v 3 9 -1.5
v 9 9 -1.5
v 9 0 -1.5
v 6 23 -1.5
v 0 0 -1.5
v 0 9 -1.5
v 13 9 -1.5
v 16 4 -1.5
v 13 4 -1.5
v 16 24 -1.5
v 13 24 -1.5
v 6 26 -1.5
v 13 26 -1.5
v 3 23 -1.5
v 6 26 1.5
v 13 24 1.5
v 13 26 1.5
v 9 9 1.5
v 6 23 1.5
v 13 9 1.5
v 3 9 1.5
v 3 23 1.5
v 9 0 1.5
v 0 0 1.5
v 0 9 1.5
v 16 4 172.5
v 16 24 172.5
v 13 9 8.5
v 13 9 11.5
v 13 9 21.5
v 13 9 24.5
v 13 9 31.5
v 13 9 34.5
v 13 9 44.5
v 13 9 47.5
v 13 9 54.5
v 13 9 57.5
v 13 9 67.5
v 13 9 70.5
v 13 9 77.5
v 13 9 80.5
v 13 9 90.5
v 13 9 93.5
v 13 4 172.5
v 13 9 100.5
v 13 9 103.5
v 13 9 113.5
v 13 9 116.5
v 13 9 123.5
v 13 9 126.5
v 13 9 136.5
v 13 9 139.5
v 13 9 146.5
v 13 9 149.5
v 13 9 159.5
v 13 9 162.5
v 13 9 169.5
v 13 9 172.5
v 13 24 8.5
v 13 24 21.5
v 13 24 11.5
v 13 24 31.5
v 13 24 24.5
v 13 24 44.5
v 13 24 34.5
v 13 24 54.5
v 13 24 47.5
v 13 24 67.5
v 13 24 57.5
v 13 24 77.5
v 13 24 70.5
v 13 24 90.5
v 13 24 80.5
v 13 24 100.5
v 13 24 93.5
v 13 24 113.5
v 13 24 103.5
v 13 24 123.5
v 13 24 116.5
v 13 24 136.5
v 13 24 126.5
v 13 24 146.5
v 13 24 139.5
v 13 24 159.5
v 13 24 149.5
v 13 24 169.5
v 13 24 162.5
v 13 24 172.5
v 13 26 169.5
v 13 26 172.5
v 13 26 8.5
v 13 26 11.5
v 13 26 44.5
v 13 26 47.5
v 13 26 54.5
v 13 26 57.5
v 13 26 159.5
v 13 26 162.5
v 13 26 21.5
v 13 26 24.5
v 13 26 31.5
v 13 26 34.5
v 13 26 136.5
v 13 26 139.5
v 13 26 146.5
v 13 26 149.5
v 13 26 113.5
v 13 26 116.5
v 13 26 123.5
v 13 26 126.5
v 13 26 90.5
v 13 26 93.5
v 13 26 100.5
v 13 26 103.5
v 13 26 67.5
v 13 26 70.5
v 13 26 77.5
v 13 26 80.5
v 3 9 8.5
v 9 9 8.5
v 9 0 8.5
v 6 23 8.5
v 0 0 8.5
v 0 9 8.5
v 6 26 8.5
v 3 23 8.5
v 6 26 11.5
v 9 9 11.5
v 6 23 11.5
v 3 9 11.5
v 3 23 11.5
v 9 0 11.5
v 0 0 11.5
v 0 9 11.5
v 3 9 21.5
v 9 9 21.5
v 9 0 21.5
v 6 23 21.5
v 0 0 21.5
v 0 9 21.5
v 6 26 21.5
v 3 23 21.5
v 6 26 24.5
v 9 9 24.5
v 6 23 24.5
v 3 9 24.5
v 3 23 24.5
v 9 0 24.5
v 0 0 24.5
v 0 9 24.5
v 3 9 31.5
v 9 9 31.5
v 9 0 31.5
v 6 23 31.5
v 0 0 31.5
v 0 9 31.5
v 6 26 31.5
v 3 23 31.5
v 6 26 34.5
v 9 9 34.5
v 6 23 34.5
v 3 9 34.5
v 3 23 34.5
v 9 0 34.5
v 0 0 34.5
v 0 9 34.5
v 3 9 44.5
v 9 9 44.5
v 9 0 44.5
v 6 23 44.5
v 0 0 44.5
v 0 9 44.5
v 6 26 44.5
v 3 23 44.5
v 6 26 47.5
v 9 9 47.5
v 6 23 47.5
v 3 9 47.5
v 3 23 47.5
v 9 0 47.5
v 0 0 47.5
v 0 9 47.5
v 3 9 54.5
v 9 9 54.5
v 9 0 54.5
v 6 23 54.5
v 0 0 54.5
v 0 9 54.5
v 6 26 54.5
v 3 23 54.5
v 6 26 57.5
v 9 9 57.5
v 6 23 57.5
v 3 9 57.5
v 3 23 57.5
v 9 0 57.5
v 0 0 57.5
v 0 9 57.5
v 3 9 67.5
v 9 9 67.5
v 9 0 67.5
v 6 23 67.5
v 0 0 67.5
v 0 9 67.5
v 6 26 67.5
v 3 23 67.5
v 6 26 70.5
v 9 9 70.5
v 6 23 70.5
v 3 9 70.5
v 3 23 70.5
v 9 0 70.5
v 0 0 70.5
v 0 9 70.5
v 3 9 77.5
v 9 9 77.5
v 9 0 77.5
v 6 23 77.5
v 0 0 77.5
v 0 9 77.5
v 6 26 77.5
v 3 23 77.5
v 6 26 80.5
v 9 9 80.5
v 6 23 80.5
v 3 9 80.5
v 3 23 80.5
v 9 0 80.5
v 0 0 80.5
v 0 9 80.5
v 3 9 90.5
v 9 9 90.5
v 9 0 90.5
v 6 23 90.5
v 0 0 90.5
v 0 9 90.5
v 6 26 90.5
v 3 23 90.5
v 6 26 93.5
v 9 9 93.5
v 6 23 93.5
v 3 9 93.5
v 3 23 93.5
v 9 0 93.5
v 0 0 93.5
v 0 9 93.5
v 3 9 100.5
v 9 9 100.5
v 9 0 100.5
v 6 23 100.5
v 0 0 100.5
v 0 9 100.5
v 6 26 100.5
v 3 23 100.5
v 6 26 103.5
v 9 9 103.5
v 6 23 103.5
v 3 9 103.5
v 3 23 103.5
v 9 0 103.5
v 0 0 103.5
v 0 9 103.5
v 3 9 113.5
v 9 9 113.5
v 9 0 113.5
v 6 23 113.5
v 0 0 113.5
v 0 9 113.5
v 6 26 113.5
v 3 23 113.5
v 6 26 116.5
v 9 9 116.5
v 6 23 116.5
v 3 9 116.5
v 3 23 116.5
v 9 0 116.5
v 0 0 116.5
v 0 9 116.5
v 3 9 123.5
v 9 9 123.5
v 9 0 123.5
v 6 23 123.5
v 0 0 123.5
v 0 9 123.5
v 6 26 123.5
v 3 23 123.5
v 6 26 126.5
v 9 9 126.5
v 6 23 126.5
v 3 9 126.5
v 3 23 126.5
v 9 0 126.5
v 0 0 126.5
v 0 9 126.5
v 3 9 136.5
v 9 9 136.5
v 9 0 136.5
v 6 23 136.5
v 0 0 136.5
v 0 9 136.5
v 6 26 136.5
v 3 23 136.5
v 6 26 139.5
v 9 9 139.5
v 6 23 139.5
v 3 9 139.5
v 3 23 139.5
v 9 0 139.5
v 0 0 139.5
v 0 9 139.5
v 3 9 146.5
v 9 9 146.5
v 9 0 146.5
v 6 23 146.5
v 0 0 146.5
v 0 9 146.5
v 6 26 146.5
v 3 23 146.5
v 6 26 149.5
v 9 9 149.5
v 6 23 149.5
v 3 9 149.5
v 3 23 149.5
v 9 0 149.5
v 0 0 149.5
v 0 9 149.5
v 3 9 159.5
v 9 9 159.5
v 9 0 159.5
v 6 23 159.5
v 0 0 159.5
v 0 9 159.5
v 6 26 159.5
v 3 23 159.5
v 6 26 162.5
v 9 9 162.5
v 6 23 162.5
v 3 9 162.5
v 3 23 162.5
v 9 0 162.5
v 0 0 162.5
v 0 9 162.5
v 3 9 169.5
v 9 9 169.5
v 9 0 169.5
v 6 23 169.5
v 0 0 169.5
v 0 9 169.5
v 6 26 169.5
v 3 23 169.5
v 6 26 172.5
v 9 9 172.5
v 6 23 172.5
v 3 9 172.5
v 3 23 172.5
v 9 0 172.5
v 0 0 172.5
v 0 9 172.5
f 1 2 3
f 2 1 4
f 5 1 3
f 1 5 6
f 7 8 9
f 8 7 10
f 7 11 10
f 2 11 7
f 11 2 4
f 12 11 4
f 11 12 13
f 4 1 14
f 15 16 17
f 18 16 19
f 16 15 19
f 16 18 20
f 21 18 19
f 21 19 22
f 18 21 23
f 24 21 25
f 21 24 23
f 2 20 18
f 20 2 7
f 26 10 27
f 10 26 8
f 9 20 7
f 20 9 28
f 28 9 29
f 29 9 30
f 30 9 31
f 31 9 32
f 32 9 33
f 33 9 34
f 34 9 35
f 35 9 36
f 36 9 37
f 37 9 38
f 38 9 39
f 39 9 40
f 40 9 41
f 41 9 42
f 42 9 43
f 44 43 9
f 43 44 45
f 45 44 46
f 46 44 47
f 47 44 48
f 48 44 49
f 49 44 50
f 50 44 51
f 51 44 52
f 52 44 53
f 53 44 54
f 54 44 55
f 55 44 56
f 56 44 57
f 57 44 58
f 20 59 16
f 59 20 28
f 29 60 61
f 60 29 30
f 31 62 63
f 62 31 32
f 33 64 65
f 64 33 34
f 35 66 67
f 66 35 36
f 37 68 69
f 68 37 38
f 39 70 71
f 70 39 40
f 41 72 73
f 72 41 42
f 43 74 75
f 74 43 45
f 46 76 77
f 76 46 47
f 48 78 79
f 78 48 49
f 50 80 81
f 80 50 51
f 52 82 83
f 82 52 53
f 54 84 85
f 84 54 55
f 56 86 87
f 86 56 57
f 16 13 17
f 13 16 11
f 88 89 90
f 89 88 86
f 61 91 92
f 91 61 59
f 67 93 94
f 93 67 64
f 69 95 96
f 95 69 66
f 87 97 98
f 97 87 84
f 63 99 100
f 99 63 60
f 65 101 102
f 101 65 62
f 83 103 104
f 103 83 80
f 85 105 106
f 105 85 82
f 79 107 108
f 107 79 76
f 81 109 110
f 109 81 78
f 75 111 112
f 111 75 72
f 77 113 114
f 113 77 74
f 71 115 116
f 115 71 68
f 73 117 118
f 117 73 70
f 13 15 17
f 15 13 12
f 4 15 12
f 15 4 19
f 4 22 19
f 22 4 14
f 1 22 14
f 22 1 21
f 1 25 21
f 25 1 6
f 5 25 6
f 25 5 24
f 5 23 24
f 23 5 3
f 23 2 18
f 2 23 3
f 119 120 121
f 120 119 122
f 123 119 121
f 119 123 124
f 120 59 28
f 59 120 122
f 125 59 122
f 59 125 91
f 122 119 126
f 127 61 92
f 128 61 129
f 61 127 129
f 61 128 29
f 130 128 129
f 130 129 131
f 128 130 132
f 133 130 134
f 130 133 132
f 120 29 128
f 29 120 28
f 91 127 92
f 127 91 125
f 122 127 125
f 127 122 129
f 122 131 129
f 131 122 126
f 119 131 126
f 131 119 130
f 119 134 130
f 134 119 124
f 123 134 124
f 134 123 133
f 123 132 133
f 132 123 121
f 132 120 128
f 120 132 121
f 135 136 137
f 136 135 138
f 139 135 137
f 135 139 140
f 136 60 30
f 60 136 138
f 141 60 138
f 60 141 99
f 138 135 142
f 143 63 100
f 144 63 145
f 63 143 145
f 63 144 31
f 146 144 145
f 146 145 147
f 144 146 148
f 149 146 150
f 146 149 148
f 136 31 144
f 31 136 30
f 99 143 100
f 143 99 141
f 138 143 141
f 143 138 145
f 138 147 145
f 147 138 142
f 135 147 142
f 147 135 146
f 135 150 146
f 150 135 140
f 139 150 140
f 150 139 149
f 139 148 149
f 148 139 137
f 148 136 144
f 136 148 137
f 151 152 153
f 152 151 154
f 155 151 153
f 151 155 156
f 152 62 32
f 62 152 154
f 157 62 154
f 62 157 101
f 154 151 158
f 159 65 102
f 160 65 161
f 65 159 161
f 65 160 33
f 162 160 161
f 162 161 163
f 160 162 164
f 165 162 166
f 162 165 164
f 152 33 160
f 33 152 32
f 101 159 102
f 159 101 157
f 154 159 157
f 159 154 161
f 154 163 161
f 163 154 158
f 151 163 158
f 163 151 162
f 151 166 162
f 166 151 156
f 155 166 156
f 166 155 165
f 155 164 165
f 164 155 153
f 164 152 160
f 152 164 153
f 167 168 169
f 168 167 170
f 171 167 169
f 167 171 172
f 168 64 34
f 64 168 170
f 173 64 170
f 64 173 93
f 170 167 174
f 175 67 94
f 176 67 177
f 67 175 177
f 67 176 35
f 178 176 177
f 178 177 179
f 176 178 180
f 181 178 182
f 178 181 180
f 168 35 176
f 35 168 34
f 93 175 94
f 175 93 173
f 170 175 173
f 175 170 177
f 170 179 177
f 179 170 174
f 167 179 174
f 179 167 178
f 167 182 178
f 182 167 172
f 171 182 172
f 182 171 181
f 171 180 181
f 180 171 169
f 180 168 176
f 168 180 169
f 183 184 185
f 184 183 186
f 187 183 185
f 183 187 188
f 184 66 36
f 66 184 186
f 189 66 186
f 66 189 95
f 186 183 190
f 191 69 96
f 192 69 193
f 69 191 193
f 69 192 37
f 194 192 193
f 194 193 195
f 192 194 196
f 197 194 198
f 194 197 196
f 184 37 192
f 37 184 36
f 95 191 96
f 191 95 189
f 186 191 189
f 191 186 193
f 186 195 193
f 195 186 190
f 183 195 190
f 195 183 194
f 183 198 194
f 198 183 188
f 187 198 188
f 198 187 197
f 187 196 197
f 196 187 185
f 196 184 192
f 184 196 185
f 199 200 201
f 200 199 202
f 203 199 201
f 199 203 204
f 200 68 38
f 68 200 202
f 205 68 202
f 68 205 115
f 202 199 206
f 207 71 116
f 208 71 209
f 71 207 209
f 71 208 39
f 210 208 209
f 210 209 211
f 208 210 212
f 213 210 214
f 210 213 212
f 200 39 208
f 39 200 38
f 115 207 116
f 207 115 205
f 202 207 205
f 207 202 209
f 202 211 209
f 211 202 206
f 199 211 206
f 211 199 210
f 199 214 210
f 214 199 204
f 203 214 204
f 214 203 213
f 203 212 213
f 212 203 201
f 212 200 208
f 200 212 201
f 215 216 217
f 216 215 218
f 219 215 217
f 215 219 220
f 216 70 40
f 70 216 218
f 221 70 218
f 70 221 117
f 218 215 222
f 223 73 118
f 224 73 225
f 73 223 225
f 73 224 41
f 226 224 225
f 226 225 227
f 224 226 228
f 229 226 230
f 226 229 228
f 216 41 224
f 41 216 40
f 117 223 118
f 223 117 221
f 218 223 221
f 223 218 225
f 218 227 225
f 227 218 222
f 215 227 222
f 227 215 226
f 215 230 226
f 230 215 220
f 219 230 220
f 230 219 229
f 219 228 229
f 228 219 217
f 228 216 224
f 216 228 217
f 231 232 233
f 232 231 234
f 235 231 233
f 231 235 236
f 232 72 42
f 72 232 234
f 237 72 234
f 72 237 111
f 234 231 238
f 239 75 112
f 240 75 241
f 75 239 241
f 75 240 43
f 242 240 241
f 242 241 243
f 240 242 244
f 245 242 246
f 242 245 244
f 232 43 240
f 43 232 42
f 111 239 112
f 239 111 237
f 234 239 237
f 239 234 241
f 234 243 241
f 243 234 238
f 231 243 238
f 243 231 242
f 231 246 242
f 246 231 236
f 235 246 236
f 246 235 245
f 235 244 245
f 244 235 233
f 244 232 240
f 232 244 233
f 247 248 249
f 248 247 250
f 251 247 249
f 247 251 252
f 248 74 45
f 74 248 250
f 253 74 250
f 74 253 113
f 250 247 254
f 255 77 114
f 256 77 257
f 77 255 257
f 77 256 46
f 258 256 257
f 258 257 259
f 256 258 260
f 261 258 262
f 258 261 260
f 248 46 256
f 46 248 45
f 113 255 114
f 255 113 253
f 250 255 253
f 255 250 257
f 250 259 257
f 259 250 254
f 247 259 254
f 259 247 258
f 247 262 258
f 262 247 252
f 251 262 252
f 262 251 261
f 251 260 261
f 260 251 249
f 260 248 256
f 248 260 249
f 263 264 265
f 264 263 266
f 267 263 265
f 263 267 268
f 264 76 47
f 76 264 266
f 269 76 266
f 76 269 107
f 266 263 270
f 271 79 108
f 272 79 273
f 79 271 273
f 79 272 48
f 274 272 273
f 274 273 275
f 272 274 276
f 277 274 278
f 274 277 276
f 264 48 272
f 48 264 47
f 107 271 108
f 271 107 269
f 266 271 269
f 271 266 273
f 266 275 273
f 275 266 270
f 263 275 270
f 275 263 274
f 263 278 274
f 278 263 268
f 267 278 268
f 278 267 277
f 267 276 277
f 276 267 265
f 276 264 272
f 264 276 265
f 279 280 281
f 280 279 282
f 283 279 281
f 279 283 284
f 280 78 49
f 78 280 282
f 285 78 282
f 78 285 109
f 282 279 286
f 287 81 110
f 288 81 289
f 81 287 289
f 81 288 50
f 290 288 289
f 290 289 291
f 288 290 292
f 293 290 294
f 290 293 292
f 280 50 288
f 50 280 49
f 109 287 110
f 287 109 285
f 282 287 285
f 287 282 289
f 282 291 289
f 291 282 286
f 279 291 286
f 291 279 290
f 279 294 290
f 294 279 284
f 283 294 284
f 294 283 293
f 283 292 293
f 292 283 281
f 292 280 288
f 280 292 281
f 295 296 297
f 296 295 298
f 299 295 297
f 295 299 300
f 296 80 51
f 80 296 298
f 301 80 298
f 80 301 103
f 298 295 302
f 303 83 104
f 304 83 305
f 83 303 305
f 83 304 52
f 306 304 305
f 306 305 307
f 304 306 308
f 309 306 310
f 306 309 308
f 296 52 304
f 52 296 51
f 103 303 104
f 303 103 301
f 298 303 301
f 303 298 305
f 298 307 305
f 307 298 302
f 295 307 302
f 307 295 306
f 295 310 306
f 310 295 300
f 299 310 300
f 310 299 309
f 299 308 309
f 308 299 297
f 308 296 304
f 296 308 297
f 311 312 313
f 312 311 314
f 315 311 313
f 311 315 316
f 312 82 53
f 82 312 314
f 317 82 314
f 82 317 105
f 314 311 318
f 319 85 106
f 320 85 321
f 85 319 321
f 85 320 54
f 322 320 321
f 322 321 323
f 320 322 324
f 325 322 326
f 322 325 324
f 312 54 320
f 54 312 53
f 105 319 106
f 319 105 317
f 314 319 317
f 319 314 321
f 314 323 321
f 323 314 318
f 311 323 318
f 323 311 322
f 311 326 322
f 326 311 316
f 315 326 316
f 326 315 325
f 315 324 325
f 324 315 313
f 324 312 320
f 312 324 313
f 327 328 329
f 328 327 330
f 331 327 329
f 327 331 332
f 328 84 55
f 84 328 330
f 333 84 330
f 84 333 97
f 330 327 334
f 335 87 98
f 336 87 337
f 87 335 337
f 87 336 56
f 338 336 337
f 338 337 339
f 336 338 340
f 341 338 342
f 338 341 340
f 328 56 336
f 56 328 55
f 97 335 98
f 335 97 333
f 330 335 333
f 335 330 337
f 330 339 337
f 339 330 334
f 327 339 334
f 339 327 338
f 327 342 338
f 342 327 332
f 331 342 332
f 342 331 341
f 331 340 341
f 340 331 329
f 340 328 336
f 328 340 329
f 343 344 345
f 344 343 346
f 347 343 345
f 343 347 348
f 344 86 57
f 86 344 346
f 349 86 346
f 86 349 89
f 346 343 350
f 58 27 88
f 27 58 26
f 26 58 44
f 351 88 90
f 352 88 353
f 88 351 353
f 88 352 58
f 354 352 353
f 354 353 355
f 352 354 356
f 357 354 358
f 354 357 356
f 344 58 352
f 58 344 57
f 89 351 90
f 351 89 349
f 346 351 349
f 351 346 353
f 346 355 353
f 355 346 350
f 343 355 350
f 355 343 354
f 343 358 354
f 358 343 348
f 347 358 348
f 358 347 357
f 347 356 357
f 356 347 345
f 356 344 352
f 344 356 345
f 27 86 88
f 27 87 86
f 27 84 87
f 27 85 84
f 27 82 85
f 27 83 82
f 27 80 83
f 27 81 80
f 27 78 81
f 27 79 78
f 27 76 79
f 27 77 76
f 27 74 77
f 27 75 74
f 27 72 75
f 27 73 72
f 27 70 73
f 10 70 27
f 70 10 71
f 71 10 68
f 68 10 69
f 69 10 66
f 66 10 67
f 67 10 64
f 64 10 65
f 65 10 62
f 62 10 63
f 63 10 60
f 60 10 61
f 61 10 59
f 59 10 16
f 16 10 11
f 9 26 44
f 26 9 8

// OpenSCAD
// file: globs.scad
/* Global definitions for millihertz 5 */

// Ball bearings are sold as 6mm. We have seen two
// versions, one at 6.35mm (1/4") and one at 6.15mm.

ball_bearing_diameter = 6.35;
ball_bearing_radius = ball_bearing_diameter / 2;
pipe_outer_diameter = 11;
pipe_inner_diameter = 8;

/* All dimensions are in millimetres */
memory_slope = 10; // Degrees

/** Memory cell pitch - the horizontal and vertical distances between one row and the next. Memory is arranged so one column (y) make up one word. Words are laid out vertically. */
memory_cell_pitch_x = 16;
memory_cell_pitch_y = 28 * cos(memory_slope);

// Max wire diameter is 1.59mm for 6.35mm ball bearings.
stage1_wire_diameter = 1.45; // Equivalent to AWG 15 / SWG 17.
stage2_wire_diameter = 2.337; // SWG 13

/* Number of bits used in the data. This must be 32. */
bits = 32;

/* Global pitch - the horizontal spacing between each bit */
pitch = 23;

/** Frame */

frame_internal_width = 900;
frame_internal_height = 2200;

/** Frame will probably be 50mm angle iron */
frame_width = 50;

/* Bowden cable specs based on lightweight 'snake' cable */

bowden_cable_inner_diameter = 2;
bowden_cable_outer_diameter = 3.5;

bowden_cable_travel = 10;

/* Specific names for the subtractor */
subtractor_pitch_x = pitch;
subtractor_pitch_y = 27;

memory_columns_per_cell = 8;

// Memory cell height
cell_height = 14;

// Gap between two memory cell units - allows for the last useless row
// in the cell and a gap of 20 to place a delay unit if necessary. The
// delay unit may be needed to slow the ball bearing to avoid damage to
// memory selectors.
memory_unit_gap = cell_height+20;

// centre_gap is a split in the middle of the two lanes
// to join cells together (since we will likely have two
// 16-bit memory cells, and 2 16-bit adders, there will
// be a gap needed to join them.
centre_gap = 50;

/* Colour for illustrating ball bearing paths */

bb_trace_colour = [0.5,0.0,0.0,0.5];


channel_width = 7; // Width of channels ball bearings roll in

columns_per_block = 8; // Number of columns in each injector/diverter block

enumerator_rod_travel = 7;

// Used mainly by injector
function ejector_xpos(col) = 20+col*pitch+channel_width/2;


//Operator modules to produce acrylic plates easily
module vertical_plate_x()
{
  rotate([90,0,0]) linear_extrude(height=3) children();
}

module vertical_plate_y()
{
  rotate([0,0,90]) rotate([90,0,0]) linear_extrude(height=3) children();
}

module horizontal_plate()
{
  linear_extrude(height=3) children();
}


// Distance between vertical support rails (centre to centre). This is for the internal rails. There are larger superrails which connect over longer distances.
support_rail_separation = 250;

// 250mm separation gives 235mm internal spacing between bars


// Canonical channel 0 position - the leftmost channel - should be 30mm right of the centre of the rail.

/*
     30mm
   <------>
 15mm     v
<---->    v
|    |    v
|BEAM|    v
|    |    v

*/


hex_bar_af = 4.75; // 6BA hex bar from Noggin End Metals measured as 4.75mm AF.

// Calculate the max radius of the bar
hex_bar_max_radius = (hex_bar_af / 2) / cos(30);

module hex_bar_2d() {
    r = hex_bar_max_radius;
    polygon(points = [ [ r * cos(0), r * sin(0) ],
		       [ r * cos(60), r * sin(60) ],
		       [ r * cos(120), r * sin(120) ],
		       [ r * cos(180), r * sin(180) ],
		       [ r * cos(240), r * sin(240) ],
		       [ r * cos(300), r * sin(300) ] ]);
}
// main file
// Very simple part to connect the injector to the memory.
// In later versions, see if we can roll this into the injector.

include <globs.scad>;

rib_offset = 5;

module rib_2d() {
  difference() {
    union() {
      square([9,9]);
      translate([3,0]) square([6,9+11+6]);
      translate([3,9]) square([10,11+6]);
      translate([3,9]) square([13,10]);
    }
    translate([2,9+11+3]) square([4,4]);
  }
}

module connecting_plate_2d() {
  difference() {
    translate([0, 0]) square([7*pitch+6+7, 20]);
      for(i=[0:7]) {
	translate([i*pitch, 5]) {
	  square([3,10]);
	}
	translate([i*pitch+10, 5]) {
	  square([3,10]);
	}
      }
  }
}


for(i=[0:7]) {
  translate([0, 0, i*pitch]) {
    translate([0,0,-1.5]) linear_extrude(height=3) rib_2d();
    translate([0,0,1.5+7]) linear_extrude(height=3) rib_2d();
  }
}

 translate([16,4,-1.5]) color([1,0,0])  rotate([0,-90,0]) linear_extrude(height=3) connecting_plate_2d();
